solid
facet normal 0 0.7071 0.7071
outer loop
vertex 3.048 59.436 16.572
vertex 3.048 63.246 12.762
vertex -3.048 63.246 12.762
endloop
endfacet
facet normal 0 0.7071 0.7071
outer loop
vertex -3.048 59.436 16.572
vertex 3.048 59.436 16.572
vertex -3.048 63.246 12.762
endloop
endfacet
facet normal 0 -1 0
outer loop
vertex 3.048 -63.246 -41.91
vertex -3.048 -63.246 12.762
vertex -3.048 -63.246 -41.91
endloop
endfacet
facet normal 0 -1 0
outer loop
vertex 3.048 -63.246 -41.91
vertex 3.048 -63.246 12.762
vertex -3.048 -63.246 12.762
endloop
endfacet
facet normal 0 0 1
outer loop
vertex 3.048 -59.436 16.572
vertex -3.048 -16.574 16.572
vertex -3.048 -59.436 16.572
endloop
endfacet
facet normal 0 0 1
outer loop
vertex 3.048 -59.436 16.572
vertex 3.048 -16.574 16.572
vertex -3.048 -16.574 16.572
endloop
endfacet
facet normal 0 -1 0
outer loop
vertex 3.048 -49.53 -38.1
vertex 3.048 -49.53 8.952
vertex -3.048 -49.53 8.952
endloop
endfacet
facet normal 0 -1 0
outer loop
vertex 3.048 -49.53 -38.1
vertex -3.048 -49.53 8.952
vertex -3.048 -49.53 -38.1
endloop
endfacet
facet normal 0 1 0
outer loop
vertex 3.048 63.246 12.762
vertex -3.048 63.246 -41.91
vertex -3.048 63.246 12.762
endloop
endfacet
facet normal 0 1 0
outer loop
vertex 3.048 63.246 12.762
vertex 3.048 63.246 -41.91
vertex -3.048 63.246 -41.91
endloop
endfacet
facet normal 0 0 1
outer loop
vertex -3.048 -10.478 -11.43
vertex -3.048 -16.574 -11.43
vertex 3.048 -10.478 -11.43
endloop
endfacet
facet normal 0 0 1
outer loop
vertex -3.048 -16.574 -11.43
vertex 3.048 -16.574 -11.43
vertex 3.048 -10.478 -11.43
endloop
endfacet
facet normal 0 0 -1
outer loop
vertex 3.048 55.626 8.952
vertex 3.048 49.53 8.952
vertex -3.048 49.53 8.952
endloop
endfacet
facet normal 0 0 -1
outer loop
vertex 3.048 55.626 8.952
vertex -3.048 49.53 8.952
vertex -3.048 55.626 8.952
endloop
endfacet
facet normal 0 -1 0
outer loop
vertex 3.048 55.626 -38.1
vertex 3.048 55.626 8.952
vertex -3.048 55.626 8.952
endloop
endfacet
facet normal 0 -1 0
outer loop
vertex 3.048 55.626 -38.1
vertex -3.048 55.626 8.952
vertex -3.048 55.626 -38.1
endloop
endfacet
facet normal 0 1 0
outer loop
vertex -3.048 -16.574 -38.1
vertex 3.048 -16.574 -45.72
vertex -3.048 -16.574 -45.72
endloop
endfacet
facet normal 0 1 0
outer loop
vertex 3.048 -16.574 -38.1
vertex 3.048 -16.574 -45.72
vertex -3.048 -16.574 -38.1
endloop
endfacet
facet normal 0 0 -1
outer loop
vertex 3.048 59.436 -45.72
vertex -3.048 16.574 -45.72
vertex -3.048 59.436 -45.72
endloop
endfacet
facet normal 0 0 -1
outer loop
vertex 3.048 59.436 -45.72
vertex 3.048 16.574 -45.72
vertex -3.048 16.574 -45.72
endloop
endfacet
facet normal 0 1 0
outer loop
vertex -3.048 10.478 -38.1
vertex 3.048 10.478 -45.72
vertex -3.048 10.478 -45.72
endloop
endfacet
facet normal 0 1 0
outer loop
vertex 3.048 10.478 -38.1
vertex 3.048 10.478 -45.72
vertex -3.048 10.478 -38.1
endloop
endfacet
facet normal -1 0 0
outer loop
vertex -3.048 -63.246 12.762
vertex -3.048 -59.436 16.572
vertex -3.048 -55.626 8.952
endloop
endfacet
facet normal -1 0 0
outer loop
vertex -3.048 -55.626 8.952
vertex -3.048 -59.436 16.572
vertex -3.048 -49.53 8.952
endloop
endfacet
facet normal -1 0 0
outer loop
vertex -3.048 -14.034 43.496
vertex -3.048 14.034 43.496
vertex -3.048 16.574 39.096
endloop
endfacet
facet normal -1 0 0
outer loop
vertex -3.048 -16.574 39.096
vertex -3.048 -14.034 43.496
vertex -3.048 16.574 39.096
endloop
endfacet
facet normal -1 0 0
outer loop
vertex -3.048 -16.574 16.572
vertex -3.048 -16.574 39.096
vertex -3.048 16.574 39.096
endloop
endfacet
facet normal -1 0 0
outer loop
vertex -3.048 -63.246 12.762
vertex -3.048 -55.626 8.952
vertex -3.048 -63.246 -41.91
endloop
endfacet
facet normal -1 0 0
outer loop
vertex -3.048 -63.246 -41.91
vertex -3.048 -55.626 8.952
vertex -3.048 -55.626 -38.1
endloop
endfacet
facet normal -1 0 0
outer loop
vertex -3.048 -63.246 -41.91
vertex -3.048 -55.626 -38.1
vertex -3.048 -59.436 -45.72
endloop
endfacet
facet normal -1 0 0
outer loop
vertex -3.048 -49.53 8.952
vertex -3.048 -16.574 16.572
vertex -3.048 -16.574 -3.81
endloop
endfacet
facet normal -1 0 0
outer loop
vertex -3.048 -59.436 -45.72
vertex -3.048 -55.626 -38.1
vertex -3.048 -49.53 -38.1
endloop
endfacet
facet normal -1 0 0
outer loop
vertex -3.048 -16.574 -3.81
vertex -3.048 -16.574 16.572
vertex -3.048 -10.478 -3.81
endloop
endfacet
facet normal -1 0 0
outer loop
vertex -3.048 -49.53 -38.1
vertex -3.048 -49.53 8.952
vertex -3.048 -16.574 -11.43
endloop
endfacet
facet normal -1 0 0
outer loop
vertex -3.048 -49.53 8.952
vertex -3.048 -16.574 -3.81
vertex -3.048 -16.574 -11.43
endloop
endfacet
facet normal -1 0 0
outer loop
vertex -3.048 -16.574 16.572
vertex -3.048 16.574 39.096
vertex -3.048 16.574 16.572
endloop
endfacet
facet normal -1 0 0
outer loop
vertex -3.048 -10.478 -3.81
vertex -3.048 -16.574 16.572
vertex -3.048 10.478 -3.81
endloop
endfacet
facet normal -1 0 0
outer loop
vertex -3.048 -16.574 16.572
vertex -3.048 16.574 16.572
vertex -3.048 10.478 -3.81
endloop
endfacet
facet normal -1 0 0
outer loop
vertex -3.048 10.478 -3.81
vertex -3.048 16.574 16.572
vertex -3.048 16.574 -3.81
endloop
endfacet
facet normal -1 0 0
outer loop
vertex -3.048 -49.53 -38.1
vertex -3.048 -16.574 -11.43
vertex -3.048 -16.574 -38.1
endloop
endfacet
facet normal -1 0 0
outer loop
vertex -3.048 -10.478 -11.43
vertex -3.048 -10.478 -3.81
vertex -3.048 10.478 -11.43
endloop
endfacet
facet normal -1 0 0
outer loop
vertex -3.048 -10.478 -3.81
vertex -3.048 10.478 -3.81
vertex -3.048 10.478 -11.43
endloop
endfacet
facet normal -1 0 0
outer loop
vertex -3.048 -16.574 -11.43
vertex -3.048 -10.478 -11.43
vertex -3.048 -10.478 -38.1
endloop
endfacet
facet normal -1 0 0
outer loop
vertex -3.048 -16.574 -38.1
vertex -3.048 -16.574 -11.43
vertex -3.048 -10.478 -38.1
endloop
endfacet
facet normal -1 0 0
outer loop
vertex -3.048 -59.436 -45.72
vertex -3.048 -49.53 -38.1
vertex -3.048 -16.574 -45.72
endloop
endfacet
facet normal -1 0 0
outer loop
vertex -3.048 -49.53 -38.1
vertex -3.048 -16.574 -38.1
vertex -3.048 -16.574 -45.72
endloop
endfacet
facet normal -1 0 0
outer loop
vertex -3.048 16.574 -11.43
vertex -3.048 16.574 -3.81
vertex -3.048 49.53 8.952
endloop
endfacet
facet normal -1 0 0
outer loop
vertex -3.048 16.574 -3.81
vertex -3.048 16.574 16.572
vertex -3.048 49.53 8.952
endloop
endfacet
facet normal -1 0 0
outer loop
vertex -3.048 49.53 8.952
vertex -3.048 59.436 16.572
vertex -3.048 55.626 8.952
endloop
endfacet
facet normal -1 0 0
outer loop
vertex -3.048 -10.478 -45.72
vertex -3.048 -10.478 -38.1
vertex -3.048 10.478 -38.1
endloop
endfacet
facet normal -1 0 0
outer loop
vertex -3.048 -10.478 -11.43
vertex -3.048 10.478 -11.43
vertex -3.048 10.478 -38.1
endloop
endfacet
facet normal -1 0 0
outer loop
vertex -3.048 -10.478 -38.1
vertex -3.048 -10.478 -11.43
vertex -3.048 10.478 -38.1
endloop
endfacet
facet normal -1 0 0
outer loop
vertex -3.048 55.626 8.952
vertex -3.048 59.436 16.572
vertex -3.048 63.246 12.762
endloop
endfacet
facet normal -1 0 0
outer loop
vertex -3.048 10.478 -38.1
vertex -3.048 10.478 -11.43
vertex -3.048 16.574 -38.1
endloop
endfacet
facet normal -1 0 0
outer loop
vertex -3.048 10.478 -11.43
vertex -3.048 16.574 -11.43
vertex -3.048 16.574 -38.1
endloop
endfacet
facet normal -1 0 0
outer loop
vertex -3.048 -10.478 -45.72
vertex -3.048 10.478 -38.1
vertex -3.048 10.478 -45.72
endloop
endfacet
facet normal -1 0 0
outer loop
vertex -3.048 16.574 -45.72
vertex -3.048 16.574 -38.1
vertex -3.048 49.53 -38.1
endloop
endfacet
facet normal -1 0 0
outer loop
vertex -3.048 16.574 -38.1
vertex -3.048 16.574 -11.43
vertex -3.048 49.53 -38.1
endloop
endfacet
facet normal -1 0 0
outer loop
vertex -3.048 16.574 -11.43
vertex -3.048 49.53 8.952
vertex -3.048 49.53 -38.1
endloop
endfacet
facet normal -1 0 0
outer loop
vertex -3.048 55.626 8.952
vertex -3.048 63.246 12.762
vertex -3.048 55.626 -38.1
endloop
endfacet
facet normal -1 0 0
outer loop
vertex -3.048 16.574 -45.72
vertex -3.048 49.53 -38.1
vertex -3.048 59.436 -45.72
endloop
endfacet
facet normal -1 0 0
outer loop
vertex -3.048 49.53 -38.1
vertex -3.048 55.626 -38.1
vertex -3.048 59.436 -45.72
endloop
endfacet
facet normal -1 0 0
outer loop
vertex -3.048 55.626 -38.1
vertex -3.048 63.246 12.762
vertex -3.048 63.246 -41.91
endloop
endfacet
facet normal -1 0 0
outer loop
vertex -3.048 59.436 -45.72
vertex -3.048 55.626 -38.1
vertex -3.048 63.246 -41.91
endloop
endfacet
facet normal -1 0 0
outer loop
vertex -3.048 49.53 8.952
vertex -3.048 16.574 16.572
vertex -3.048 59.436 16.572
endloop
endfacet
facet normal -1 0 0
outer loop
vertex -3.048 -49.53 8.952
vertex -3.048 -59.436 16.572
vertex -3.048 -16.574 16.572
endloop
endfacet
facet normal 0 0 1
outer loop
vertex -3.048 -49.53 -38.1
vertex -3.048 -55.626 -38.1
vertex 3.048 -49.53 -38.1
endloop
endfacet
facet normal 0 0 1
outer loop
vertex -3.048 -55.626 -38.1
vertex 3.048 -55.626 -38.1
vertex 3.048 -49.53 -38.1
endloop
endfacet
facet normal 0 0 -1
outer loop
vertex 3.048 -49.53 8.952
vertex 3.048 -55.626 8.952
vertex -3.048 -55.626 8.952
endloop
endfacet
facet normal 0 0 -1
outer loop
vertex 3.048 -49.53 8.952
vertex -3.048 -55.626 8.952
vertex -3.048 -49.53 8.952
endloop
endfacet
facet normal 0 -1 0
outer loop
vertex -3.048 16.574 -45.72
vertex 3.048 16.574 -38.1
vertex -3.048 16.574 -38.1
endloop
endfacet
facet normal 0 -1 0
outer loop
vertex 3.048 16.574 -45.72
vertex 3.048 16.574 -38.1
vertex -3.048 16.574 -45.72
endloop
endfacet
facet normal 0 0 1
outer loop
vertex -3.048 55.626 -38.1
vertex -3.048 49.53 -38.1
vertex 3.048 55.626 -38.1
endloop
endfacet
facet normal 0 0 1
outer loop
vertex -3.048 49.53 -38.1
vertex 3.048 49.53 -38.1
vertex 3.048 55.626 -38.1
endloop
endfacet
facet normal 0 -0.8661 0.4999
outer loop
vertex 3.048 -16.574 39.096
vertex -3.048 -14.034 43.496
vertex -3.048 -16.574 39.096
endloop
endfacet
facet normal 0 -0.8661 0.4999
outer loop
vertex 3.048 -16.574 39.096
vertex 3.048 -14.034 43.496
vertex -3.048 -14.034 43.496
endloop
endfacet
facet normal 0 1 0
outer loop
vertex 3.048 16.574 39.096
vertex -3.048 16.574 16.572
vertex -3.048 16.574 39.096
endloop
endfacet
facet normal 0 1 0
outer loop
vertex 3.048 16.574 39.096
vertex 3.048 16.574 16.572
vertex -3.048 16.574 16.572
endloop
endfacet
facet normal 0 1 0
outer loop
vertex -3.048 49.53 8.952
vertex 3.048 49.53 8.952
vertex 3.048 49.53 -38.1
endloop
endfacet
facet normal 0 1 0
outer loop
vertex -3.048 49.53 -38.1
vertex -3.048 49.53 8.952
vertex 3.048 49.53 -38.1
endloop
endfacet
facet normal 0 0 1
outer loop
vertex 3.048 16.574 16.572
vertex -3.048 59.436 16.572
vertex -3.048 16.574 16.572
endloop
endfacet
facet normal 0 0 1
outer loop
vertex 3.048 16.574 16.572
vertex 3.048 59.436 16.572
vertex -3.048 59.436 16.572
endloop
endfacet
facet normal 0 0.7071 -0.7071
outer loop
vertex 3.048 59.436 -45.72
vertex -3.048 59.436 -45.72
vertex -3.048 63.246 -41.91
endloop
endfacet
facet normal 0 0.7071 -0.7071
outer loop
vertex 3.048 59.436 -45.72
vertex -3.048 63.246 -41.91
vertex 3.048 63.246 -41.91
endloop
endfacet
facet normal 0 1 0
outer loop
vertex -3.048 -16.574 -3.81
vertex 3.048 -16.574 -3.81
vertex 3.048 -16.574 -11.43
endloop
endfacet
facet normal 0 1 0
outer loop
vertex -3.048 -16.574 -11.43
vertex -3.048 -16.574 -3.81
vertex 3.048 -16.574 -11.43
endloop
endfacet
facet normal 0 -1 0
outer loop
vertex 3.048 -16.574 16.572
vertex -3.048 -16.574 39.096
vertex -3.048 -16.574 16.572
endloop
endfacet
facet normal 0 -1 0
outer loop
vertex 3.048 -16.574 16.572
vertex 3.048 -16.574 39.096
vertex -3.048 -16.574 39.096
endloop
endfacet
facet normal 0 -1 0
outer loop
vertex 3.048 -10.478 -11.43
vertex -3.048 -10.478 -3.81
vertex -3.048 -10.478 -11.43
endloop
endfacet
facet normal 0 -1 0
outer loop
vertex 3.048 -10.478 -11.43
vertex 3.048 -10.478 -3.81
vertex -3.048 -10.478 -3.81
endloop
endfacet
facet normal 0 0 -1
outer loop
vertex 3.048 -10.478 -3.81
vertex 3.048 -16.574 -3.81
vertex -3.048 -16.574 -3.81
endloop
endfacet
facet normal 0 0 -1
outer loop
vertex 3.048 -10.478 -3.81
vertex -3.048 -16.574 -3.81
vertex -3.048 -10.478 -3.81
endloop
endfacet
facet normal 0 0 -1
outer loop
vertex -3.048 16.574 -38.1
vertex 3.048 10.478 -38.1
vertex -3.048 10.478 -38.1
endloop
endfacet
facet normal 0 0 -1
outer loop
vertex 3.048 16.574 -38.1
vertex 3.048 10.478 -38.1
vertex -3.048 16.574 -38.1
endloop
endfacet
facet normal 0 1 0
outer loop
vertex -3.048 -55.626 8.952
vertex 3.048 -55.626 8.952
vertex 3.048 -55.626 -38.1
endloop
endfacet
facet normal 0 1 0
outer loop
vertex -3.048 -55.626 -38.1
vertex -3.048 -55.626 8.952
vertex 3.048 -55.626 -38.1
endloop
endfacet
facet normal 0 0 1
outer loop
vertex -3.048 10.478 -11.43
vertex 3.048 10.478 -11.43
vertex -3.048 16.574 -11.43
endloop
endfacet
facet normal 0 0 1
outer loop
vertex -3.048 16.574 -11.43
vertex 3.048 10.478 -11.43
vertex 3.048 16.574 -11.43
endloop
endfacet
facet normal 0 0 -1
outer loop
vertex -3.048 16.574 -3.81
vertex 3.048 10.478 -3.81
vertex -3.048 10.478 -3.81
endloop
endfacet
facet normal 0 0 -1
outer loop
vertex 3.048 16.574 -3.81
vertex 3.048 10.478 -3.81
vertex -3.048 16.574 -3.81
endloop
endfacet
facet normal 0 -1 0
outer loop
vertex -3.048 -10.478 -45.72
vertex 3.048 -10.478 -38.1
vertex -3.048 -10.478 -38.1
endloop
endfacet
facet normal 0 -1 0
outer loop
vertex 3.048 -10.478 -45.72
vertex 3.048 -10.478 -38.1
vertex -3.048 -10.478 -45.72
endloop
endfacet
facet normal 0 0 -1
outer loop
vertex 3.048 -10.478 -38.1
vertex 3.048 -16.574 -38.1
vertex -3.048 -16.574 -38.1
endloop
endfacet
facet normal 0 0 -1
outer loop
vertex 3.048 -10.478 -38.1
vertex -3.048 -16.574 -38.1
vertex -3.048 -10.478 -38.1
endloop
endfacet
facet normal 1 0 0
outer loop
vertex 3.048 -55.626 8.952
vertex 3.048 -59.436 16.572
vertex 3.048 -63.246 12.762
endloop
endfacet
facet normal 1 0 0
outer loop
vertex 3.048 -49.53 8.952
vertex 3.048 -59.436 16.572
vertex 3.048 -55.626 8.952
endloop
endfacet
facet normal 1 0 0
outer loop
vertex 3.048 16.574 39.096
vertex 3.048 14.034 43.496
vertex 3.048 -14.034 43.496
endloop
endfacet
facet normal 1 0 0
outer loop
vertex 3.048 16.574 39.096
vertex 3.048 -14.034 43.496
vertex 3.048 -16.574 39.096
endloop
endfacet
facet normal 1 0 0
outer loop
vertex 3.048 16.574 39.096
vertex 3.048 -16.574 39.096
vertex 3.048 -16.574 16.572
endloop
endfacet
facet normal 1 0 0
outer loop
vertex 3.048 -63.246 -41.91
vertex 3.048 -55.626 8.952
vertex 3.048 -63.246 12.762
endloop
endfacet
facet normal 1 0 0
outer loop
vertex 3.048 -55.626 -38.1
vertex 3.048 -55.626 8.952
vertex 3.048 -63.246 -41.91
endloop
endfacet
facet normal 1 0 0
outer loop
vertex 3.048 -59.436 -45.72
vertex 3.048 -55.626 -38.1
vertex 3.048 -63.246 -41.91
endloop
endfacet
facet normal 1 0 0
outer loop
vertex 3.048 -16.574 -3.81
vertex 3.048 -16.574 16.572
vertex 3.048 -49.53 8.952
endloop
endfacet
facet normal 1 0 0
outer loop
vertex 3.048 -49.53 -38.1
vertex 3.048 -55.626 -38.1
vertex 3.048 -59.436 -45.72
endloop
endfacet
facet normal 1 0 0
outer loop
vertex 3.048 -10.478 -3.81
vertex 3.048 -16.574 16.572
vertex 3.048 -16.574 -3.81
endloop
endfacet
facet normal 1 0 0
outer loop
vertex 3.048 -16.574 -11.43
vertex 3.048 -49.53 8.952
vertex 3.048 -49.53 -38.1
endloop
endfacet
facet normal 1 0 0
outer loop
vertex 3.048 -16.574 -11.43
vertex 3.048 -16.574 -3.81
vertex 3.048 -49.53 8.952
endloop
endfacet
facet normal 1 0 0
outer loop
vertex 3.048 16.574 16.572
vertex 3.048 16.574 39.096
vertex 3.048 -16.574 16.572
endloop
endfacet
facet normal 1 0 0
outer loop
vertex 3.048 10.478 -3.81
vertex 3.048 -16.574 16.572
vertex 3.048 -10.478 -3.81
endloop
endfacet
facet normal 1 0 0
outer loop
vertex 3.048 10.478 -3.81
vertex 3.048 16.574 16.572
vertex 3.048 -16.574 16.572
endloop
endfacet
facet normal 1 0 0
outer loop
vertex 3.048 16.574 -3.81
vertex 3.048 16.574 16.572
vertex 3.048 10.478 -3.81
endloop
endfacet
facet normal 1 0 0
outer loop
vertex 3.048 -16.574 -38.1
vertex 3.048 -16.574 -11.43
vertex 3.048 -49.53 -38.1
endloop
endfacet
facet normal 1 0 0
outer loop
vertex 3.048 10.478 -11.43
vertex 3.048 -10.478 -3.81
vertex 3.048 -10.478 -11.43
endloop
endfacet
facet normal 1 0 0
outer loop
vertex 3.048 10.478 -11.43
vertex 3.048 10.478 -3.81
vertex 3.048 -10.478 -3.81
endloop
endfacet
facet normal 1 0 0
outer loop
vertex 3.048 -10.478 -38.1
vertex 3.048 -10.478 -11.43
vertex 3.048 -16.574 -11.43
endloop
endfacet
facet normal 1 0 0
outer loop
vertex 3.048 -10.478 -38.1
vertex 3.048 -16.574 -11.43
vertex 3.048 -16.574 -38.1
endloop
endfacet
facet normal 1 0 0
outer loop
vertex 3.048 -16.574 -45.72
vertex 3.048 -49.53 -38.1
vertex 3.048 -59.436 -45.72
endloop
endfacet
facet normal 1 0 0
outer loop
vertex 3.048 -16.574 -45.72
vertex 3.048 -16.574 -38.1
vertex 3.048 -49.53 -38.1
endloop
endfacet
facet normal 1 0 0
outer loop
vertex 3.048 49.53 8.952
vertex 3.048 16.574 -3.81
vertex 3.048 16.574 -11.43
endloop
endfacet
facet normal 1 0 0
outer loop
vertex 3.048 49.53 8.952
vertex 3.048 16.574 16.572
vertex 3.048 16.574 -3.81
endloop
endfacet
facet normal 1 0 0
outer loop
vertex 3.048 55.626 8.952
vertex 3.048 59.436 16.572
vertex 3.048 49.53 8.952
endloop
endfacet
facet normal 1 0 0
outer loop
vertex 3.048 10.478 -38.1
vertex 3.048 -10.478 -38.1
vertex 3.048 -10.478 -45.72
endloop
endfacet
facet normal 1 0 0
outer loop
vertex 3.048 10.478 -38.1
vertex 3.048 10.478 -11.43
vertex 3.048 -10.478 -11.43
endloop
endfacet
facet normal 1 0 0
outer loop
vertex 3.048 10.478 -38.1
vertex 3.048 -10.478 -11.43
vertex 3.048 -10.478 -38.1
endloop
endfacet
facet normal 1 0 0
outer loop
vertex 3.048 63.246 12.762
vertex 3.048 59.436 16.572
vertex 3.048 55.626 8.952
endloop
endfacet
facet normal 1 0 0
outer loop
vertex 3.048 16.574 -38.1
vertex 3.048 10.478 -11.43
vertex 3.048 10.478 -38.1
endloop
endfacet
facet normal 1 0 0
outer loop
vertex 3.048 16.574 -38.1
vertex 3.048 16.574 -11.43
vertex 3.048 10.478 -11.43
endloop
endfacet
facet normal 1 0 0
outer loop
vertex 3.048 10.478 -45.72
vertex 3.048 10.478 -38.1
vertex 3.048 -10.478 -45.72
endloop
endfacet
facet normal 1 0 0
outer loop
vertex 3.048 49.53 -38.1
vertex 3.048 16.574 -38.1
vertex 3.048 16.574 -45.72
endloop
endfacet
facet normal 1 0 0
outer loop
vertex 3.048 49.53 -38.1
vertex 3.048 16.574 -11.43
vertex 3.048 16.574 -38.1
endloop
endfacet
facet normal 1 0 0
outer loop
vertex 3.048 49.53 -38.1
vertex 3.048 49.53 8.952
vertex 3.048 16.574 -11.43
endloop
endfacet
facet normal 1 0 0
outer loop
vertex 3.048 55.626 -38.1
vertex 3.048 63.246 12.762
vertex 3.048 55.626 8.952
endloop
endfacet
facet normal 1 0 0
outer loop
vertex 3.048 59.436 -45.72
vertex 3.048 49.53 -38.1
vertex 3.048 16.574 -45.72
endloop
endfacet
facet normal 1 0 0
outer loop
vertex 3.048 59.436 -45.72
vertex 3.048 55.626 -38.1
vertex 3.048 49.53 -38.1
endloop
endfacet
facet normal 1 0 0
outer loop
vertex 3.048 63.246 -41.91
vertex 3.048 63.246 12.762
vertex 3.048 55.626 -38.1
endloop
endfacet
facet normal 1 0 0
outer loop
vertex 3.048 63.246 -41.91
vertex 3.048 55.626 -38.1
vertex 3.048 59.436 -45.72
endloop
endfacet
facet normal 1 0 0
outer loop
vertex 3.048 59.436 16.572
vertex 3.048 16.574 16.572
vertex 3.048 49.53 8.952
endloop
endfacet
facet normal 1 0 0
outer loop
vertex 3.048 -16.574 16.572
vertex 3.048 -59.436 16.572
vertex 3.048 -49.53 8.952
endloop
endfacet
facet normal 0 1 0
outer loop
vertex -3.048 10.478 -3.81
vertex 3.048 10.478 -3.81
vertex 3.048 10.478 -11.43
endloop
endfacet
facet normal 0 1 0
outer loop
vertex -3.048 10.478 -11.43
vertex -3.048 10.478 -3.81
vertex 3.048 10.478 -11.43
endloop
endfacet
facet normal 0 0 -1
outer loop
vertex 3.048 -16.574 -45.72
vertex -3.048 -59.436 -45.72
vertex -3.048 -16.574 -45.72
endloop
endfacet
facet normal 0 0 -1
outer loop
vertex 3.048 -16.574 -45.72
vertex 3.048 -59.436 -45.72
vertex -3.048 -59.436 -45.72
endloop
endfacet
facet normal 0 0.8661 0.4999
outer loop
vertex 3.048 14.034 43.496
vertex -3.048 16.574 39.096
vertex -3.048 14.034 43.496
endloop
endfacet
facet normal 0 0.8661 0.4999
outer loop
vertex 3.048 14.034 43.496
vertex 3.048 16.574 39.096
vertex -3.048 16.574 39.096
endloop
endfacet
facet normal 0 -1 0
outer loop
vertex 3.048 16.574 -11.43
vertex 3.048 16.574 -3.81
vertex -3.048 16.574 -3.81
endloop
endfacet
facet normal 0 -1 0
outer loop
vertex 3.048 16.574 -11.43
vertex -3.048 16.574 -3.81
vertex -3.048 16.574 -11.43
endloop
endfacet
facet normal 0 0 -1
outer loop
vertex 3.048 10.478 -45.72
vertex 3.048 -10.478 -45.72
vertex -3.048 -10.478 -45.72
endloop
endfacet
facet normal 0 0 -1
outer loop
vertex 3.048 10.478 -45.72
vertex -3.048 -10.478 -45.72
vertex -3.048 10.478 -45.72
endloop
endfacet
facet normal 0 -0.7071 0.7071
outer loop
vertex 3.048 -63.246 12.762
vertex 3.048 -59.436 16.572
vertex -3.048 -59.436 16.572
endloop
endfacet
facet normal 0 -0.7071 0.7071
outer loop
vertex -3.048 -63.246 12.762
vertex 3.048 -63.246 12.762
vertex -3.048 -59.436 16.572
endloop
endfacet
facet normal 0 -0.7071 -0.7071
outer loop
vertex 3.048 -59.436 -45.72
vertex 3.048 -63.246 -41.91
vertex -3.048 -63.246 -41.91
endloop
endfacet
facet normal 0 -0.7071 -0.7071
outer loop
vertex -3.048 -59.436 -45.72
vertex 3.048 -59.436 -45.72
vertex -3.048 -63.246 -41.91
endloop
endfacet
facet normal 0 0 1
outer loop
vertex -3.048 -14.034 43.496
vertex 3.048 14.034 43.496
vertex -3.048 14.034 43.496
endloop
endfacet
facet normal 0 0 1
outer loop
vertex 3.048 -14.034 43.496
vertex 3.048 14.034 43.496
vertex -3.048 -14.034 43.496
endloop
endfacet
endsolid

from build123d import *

# Parameters (mm, degrees)
SKETCH1_W           = 47.051856626
SKETCH1_H           = 6.096
SKETCH1_W_2         = 7.62
BOSS_EXTRUDE1_DEPTH = 3.048
CHAMFER2_SIZE       = 3.81


with BuildPart() as part:
    # Sketch1 → Boss-Extrude1 (new body, symmetric)
    with BuildSketch(Plane(origin=(0, 0, 0), x_dir=(0, 0, -1), z_dir=(1, 0, 0))):
        Polygon((45.72, -63.246), (45.72, -16.5735), (38.1, -16.5735), (38.1, -10.4775), (45.72, -10.4775), (45.72, 10.4775), (38.1, 10.4775), (38.1, 16.5735), (45.72, 16.5735), (45.72, 63.246), (-16.571856626, 63.246), (-16.571856626, 16.5735), (-39.096447575, 16.5735), (-43.495856626, 14.0335), (-43.495856626, -14.0335), (-39.096447575, -16.5735), (-16.571856626, -16.5735), (-16.571856626, -63.246), align=None)
        with Locations((14.574071687, -52.578)):
            Rectangle(SKETCH1_W, SKETCH1_H, mode=Mode.SUBTRACT)
        with Locations((14.574071687, 52.578)):
            Rectangle(SKETCH1_W, SKETCH1_H, mode=Mode.SUBTRACT)
        with Locations((7.62, 13.5255)):
            Rectangle(SKETCH1_W_2, SKETCH1_H, mode=Mode.SUBTRACT)
        with Locations((7.62, -13.5255)):
            Rectangle(SKETCH1_W_2, SKETCH1_H, mode=Mode.SUBTRACT)
    extrude(amount=BOSS_EXTRUDE1_DEPTH, both=True)

    # Chamfer2
    chamfer2_edges = [part.edges().sort_by_distance(p)[0] for p in [
        (0, -63.246, -45.72),
        (0, -63.246, 16.571856626),
        (0, 63.246, 16.571856626),
        (0, 63.246, -45.72),
    ]]
    chamfer(chamfer2_edges, length=CHAMFER2_SIZE)


solid = part.part
